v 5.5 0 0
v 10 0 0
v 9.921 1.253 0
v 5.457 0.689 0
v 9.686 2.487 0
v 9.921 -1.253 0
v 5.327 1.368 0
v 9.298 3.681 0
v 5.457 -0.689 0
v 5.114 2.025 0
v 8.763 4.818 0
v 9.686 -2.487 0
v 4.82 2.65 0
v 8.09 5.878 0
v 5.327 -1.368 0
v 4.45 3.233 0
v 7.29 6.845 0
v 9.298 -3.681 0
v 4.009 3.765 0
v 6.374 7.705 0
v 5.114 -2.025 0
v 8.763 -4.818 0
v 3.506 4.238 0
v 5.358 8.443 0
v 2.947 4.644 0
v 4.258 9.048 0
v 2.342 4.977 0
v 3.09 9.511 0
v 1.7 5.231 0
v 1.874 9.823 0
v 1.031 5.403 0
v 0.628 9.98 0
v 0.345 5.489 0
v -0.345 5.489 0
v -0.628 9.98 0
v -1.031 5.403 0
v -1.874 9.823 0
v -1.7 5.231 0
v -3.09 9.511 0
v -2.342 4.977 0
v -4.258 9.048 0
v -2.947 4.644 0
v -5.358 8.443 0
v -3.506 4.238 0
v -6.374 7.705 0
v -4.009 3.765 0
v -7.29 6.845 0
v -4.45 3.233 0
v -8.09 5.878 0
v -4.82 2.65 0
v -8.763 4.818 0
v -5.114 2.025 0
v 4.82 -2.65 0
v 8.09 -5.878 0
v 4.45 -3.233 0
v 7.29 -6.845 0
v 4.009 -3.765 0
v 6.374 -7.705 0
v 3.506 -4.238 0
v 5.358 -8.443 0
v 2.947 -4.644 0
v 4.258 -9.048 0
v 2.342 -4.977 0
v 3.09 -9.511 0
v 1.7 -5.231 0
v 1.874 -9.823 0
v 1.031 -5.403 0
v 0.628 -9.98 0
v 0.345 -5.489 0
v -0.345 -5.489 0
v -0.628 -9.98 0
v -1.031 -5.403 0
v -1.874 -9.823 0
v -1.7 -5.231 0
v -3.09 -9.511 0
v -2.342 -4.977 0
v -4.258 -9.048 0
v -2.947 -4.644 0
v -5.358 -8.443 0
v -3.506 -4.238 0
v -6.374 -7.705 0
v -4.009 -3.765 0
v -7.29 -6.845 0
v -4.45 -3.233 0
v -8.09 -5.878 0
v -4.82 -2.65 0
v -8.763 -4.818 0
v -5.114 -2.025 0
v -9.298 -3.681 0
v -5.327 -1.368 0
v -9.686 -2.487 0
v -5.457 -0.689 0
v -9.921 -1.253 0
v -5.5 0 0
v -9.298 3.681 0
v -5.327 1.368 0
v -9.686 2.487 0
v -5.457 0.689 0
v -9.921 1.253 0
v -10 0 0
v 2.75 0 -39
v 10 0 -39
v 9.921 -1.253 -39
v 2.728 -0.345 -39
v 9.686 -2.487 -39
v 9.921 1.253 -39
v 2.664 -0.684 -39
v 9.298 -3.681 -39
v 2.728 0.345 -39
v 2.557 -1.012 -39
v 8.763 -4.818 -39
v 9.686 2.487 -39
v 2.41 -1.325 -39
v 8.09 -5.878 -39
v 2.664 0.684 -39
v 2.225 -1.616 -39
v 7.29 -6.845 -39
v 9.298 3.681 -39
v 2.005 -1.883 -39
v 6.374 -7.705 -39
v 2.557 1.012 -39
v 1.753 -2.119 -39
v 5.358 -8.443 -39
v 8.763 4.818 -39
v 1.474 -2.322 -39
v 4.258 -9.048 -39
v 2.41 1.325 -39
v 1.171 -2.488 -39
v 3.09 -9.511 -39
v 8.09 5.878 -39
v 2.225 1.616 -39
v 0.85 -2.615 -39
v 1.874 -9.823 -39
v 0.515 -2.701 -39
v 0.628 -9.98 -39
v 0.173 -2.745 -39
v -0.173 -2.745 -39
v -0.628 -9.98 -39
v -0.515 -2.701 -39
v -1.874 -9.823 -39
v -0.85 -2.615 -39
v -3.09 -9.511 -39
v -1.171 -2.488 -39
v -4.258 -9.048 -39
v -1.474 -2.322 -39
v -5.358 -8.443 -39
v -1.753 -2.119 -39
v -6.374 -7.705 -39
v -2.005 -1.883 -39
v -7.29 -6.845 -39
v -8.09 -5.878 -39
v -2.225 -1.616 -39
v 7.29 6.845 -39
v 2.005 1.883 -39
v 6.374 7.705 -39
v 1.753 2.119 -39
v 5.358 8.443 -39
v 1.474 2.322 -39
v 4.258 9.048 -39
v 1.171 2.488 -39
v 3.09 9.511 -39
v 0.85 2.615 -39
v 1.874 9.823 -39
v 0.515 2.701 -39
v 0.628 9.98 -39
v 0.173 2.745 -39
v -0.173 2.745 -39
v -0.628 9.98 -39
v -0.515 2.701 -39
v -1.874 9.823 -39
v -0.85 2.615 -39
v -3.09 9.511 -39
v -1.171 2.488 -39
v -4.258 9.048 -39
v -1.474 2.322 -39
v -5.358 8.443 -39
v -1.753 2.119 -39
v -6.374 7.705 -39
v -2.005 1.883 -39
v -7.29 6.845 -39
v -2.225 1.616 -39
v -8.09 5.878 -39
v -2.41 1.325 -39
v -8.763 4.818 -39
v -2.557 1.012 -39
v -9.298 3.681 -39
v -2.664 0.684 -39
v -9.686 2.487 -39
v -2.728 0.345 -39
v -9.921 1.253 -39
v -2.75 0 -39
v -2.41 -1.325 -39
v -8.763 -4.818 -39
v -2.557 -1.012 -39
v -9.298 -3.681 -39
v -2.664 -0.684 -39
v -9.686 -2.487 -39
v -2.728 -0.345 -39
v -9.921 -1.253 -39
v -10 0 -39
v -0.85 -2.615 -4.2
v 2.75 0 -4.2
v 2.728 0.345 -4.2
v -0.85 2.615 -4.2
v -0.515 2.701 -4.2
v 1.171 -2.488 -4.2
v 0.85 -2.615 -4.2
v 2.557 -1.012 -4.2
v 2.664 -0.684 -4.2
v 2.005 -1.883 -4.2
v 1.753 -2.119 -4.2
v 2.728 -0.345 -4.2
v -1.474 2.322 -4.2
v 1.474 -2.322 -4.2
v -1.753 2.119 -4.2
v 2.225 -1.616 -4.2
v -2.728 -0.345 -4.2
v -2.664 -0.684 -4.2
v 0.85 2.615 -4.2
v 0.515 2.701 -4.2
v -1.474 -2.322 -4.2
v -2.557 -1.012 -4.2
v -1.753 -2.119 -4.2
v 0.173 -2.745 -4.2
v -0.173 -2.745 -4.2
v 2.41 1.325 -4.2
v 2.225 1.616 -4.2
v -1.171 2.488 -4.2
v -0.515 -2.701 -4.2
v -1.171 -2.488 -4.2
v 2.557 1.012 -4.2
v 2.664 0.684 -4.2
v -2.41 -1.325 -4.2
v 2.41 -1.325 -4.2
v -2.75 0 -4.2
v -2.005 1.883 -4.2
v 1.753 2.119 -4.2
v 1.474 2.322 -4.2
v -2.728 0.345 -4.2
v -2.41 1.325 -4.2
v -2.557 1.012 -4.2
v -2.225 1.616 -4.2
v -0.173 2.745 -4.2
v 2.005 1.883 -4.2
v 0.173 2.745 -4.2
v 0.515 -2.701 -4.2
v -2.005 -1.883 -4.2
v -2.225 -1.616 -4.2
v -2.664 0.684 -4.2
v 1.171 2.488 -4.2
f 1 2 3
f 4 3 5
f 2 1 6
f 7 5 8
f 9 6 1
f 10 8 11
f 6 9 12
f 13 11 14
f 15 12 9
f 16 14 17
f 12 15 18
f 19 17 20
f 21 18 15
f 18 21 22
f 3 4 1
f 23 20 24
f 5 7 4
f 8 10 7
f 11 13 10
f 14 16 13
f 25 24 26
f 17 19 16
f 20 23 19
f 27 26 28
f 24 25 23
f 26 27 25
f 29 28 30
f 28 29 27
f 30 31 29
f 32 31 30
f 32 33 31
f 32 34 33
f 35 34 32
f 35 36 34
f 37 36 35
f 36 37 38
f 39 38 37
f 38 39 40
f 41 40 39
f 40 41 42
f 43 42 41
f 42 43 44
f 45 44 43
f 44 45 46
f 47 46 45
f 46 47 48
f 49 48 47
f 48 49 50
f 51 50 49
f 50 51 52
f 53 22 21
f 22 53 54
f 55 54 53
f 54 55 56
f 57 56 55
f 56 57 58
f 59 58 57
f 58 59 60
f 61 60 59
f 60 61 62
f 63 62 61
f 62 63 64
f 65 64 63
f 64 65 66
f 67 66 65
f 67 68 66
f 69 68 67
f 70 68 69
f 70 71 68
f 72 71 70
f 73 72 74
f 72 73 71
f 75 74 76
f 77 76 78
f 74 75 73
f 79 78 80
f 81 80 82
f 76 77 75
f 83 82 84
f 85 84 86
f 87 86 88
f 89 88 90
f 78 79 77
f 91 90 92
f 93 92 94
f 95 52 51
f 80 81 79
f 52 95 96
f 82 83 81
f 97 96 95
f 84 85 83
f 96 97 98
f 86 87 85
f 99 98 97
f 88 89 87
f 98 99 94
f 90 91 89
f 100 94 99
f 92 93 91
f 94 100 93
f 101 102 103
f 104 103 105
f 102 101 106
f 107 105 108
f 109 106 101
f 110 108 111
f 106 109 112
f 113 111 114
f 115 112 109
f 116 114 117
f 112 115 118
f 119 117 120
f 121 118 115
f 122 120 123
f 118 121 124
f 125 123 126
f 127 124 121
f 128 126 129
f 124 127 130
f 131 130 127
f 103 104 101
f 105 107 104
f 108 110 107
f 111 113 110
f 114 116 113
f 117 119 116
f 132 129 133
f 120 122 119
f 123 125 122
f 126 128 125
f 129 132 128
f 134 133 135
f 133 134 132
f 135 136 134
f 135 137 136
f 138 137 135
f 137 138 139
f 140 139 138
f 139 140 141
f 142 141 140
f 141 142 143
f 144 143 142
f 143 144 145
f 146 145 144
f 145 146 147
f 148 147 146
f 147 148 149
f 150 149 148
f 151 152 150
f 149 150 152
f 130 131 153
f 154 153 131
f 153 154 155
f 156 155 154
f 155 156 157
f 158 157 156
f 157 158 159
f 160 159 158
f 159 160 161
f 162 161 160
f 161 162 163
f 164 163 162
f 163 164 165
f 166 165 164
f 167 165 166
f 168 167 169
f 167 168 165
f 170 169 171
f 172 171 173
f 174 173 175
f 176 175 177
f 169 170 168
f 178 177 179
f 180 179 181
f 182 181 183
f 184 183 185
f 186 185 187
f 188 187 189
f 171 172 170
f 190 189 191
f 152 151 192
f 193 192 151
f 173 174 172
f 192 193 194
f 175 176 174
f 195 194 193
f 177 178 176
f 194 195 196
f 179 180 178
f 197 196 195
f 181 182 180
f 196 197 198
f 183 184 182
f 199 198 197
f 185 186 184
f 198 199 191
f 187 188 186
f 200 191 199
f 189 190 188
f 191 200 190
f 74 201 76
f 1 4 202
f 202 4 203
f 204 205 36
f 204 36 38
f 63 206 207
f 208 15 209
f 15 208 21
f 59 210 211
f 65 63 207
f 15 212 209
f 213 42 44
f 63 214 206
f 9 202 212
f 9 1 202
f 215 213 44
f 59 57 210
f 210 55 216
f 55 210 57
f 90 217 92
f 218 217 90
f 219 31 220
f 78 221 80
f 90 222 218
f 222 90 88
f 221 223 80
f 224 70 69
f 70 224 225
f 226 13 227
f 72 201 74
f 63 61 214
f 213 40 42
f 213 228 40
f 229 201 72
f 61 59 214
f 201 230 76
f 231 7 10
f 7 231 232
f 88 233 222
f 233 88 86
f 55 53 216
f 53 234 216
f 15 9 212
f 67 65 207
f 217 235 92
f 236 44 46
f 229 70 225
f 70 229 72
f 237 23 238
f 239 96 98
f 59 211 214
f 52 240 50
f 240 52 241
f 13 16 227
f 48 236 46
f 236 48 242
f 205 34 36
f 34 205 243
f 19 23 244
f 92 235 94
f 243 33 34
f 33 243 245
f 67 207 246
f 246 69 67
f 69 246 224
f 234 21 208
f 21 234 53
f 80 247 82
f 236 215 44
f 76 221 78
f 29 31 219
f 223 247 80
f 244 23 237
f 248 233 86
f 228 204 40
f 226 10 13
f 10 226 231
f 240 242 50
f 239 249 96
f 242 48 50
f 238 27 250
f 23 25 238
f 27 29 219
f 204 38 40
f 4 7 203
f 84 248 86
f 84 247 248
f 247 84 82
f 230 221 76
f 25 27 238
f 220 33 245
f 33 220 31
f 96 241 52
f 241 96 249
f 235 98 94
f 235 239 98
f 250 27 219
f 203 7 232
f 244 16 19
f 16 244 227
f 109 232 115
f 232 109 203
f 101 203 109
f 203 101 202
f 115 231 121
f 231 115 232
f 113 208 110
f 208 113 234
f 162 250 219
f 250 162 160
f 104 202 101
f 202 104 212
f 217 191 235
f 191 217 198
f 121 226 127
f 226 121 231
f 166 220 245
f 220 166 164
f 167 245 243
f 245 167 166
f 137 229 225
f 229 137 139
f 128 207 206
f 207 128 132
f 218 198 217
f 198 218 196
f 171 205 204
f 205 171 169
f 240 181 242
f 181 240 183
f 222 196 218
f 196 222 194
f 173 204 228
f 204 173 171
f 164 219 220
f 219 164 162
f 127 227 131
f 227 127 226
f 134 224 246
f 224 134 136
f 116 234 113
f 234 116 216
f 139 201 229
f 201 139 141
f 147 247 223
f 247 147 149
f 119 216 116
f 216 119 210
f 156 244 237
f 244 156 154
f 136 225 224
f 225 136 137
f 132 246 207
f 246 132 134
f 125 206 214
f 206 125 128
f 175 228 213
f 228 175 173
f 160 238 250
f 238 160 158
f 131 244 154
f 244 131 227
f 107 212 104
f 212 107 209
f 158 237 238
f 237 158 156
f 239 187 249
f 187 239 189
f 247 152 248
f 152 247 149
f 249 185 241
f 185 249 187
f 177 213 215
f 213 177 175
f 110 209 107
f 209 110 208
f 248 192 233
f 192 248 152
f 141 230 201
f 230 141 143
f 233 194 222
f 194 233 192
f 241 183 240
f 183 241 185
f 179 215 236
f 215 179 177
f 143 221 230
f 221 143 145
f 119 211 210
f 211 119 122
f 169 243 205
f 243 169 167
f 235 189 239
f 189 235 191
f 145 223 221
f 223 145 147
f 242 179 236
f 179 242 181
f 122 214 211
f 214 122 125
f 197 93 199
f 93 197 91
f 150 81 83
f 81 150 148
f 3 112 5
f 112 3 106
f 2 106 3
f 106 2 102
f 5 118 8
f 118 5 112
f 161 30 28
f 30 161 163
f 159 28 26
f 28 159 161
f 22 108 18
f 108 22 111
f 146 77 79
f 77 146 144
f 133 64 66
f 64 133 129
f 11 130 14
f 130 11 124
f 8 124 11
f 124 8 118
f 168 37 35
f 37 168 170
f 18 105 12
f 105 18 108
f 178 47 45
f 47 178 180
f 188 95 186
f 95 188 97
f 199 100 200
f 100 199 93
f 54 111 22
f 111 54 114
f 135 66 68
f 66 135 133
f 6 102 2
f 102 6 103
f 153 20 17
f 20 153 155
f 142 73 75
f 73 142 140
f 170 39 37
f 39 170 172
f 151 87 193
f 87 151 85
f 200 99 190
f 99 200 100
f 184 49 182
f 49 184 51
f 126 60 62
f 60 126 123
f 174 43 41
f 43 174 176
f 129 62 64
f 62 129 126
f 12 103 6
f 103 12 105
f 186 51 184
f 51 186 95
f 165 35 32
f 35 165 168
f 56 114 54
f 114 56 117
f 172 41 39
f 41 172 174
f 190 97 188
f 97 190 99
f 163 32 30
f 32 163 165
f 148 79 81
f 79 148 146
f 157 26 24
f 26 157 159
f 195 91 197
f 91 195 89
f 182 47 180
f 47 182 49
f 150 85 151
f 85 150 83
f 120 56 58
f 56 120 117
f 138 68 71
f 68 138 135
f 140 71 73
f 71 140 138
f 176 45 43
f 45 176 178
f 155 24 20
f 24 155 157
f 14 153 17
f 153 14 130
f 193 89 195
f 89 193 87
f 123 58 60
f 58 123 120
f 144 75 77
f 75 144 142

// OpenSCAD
$fn = 50;


difference() {
	union() {
		translate(v = [0, 0, -39.0000000000]) {
			cylinder(h = 39, r = 10.0000000000);
		}
		cylinder(h = 0, r = 16.0000000000);
	}
	union() {
		translate(v = [0, 0, 0]) {
			rotate(a = [0, 0, 0]) {
				difference() {
					union() {
						#translate(v = [0, 0, -39.0000000000]) {
							cylinder(h = 39, r = 2.2500000000);
						}
						#translate(v = [0, 0, -4.2000000000]) {
							cylinder(h = 4.2000000000, r1 = 2.7500000000, r2 = 5.5000000000);
						}
						#translate(v = [0, 0, -39.0000000000]) {
							cylinder(h = 39, r = 2.7500000000);
						}
						#translate(v = [0, 0, -39.0000000000]) {
							cylinder(h = 39, r = 2.2500000000);
						}
					}
					union();
				}
			}
		}
	}
}
